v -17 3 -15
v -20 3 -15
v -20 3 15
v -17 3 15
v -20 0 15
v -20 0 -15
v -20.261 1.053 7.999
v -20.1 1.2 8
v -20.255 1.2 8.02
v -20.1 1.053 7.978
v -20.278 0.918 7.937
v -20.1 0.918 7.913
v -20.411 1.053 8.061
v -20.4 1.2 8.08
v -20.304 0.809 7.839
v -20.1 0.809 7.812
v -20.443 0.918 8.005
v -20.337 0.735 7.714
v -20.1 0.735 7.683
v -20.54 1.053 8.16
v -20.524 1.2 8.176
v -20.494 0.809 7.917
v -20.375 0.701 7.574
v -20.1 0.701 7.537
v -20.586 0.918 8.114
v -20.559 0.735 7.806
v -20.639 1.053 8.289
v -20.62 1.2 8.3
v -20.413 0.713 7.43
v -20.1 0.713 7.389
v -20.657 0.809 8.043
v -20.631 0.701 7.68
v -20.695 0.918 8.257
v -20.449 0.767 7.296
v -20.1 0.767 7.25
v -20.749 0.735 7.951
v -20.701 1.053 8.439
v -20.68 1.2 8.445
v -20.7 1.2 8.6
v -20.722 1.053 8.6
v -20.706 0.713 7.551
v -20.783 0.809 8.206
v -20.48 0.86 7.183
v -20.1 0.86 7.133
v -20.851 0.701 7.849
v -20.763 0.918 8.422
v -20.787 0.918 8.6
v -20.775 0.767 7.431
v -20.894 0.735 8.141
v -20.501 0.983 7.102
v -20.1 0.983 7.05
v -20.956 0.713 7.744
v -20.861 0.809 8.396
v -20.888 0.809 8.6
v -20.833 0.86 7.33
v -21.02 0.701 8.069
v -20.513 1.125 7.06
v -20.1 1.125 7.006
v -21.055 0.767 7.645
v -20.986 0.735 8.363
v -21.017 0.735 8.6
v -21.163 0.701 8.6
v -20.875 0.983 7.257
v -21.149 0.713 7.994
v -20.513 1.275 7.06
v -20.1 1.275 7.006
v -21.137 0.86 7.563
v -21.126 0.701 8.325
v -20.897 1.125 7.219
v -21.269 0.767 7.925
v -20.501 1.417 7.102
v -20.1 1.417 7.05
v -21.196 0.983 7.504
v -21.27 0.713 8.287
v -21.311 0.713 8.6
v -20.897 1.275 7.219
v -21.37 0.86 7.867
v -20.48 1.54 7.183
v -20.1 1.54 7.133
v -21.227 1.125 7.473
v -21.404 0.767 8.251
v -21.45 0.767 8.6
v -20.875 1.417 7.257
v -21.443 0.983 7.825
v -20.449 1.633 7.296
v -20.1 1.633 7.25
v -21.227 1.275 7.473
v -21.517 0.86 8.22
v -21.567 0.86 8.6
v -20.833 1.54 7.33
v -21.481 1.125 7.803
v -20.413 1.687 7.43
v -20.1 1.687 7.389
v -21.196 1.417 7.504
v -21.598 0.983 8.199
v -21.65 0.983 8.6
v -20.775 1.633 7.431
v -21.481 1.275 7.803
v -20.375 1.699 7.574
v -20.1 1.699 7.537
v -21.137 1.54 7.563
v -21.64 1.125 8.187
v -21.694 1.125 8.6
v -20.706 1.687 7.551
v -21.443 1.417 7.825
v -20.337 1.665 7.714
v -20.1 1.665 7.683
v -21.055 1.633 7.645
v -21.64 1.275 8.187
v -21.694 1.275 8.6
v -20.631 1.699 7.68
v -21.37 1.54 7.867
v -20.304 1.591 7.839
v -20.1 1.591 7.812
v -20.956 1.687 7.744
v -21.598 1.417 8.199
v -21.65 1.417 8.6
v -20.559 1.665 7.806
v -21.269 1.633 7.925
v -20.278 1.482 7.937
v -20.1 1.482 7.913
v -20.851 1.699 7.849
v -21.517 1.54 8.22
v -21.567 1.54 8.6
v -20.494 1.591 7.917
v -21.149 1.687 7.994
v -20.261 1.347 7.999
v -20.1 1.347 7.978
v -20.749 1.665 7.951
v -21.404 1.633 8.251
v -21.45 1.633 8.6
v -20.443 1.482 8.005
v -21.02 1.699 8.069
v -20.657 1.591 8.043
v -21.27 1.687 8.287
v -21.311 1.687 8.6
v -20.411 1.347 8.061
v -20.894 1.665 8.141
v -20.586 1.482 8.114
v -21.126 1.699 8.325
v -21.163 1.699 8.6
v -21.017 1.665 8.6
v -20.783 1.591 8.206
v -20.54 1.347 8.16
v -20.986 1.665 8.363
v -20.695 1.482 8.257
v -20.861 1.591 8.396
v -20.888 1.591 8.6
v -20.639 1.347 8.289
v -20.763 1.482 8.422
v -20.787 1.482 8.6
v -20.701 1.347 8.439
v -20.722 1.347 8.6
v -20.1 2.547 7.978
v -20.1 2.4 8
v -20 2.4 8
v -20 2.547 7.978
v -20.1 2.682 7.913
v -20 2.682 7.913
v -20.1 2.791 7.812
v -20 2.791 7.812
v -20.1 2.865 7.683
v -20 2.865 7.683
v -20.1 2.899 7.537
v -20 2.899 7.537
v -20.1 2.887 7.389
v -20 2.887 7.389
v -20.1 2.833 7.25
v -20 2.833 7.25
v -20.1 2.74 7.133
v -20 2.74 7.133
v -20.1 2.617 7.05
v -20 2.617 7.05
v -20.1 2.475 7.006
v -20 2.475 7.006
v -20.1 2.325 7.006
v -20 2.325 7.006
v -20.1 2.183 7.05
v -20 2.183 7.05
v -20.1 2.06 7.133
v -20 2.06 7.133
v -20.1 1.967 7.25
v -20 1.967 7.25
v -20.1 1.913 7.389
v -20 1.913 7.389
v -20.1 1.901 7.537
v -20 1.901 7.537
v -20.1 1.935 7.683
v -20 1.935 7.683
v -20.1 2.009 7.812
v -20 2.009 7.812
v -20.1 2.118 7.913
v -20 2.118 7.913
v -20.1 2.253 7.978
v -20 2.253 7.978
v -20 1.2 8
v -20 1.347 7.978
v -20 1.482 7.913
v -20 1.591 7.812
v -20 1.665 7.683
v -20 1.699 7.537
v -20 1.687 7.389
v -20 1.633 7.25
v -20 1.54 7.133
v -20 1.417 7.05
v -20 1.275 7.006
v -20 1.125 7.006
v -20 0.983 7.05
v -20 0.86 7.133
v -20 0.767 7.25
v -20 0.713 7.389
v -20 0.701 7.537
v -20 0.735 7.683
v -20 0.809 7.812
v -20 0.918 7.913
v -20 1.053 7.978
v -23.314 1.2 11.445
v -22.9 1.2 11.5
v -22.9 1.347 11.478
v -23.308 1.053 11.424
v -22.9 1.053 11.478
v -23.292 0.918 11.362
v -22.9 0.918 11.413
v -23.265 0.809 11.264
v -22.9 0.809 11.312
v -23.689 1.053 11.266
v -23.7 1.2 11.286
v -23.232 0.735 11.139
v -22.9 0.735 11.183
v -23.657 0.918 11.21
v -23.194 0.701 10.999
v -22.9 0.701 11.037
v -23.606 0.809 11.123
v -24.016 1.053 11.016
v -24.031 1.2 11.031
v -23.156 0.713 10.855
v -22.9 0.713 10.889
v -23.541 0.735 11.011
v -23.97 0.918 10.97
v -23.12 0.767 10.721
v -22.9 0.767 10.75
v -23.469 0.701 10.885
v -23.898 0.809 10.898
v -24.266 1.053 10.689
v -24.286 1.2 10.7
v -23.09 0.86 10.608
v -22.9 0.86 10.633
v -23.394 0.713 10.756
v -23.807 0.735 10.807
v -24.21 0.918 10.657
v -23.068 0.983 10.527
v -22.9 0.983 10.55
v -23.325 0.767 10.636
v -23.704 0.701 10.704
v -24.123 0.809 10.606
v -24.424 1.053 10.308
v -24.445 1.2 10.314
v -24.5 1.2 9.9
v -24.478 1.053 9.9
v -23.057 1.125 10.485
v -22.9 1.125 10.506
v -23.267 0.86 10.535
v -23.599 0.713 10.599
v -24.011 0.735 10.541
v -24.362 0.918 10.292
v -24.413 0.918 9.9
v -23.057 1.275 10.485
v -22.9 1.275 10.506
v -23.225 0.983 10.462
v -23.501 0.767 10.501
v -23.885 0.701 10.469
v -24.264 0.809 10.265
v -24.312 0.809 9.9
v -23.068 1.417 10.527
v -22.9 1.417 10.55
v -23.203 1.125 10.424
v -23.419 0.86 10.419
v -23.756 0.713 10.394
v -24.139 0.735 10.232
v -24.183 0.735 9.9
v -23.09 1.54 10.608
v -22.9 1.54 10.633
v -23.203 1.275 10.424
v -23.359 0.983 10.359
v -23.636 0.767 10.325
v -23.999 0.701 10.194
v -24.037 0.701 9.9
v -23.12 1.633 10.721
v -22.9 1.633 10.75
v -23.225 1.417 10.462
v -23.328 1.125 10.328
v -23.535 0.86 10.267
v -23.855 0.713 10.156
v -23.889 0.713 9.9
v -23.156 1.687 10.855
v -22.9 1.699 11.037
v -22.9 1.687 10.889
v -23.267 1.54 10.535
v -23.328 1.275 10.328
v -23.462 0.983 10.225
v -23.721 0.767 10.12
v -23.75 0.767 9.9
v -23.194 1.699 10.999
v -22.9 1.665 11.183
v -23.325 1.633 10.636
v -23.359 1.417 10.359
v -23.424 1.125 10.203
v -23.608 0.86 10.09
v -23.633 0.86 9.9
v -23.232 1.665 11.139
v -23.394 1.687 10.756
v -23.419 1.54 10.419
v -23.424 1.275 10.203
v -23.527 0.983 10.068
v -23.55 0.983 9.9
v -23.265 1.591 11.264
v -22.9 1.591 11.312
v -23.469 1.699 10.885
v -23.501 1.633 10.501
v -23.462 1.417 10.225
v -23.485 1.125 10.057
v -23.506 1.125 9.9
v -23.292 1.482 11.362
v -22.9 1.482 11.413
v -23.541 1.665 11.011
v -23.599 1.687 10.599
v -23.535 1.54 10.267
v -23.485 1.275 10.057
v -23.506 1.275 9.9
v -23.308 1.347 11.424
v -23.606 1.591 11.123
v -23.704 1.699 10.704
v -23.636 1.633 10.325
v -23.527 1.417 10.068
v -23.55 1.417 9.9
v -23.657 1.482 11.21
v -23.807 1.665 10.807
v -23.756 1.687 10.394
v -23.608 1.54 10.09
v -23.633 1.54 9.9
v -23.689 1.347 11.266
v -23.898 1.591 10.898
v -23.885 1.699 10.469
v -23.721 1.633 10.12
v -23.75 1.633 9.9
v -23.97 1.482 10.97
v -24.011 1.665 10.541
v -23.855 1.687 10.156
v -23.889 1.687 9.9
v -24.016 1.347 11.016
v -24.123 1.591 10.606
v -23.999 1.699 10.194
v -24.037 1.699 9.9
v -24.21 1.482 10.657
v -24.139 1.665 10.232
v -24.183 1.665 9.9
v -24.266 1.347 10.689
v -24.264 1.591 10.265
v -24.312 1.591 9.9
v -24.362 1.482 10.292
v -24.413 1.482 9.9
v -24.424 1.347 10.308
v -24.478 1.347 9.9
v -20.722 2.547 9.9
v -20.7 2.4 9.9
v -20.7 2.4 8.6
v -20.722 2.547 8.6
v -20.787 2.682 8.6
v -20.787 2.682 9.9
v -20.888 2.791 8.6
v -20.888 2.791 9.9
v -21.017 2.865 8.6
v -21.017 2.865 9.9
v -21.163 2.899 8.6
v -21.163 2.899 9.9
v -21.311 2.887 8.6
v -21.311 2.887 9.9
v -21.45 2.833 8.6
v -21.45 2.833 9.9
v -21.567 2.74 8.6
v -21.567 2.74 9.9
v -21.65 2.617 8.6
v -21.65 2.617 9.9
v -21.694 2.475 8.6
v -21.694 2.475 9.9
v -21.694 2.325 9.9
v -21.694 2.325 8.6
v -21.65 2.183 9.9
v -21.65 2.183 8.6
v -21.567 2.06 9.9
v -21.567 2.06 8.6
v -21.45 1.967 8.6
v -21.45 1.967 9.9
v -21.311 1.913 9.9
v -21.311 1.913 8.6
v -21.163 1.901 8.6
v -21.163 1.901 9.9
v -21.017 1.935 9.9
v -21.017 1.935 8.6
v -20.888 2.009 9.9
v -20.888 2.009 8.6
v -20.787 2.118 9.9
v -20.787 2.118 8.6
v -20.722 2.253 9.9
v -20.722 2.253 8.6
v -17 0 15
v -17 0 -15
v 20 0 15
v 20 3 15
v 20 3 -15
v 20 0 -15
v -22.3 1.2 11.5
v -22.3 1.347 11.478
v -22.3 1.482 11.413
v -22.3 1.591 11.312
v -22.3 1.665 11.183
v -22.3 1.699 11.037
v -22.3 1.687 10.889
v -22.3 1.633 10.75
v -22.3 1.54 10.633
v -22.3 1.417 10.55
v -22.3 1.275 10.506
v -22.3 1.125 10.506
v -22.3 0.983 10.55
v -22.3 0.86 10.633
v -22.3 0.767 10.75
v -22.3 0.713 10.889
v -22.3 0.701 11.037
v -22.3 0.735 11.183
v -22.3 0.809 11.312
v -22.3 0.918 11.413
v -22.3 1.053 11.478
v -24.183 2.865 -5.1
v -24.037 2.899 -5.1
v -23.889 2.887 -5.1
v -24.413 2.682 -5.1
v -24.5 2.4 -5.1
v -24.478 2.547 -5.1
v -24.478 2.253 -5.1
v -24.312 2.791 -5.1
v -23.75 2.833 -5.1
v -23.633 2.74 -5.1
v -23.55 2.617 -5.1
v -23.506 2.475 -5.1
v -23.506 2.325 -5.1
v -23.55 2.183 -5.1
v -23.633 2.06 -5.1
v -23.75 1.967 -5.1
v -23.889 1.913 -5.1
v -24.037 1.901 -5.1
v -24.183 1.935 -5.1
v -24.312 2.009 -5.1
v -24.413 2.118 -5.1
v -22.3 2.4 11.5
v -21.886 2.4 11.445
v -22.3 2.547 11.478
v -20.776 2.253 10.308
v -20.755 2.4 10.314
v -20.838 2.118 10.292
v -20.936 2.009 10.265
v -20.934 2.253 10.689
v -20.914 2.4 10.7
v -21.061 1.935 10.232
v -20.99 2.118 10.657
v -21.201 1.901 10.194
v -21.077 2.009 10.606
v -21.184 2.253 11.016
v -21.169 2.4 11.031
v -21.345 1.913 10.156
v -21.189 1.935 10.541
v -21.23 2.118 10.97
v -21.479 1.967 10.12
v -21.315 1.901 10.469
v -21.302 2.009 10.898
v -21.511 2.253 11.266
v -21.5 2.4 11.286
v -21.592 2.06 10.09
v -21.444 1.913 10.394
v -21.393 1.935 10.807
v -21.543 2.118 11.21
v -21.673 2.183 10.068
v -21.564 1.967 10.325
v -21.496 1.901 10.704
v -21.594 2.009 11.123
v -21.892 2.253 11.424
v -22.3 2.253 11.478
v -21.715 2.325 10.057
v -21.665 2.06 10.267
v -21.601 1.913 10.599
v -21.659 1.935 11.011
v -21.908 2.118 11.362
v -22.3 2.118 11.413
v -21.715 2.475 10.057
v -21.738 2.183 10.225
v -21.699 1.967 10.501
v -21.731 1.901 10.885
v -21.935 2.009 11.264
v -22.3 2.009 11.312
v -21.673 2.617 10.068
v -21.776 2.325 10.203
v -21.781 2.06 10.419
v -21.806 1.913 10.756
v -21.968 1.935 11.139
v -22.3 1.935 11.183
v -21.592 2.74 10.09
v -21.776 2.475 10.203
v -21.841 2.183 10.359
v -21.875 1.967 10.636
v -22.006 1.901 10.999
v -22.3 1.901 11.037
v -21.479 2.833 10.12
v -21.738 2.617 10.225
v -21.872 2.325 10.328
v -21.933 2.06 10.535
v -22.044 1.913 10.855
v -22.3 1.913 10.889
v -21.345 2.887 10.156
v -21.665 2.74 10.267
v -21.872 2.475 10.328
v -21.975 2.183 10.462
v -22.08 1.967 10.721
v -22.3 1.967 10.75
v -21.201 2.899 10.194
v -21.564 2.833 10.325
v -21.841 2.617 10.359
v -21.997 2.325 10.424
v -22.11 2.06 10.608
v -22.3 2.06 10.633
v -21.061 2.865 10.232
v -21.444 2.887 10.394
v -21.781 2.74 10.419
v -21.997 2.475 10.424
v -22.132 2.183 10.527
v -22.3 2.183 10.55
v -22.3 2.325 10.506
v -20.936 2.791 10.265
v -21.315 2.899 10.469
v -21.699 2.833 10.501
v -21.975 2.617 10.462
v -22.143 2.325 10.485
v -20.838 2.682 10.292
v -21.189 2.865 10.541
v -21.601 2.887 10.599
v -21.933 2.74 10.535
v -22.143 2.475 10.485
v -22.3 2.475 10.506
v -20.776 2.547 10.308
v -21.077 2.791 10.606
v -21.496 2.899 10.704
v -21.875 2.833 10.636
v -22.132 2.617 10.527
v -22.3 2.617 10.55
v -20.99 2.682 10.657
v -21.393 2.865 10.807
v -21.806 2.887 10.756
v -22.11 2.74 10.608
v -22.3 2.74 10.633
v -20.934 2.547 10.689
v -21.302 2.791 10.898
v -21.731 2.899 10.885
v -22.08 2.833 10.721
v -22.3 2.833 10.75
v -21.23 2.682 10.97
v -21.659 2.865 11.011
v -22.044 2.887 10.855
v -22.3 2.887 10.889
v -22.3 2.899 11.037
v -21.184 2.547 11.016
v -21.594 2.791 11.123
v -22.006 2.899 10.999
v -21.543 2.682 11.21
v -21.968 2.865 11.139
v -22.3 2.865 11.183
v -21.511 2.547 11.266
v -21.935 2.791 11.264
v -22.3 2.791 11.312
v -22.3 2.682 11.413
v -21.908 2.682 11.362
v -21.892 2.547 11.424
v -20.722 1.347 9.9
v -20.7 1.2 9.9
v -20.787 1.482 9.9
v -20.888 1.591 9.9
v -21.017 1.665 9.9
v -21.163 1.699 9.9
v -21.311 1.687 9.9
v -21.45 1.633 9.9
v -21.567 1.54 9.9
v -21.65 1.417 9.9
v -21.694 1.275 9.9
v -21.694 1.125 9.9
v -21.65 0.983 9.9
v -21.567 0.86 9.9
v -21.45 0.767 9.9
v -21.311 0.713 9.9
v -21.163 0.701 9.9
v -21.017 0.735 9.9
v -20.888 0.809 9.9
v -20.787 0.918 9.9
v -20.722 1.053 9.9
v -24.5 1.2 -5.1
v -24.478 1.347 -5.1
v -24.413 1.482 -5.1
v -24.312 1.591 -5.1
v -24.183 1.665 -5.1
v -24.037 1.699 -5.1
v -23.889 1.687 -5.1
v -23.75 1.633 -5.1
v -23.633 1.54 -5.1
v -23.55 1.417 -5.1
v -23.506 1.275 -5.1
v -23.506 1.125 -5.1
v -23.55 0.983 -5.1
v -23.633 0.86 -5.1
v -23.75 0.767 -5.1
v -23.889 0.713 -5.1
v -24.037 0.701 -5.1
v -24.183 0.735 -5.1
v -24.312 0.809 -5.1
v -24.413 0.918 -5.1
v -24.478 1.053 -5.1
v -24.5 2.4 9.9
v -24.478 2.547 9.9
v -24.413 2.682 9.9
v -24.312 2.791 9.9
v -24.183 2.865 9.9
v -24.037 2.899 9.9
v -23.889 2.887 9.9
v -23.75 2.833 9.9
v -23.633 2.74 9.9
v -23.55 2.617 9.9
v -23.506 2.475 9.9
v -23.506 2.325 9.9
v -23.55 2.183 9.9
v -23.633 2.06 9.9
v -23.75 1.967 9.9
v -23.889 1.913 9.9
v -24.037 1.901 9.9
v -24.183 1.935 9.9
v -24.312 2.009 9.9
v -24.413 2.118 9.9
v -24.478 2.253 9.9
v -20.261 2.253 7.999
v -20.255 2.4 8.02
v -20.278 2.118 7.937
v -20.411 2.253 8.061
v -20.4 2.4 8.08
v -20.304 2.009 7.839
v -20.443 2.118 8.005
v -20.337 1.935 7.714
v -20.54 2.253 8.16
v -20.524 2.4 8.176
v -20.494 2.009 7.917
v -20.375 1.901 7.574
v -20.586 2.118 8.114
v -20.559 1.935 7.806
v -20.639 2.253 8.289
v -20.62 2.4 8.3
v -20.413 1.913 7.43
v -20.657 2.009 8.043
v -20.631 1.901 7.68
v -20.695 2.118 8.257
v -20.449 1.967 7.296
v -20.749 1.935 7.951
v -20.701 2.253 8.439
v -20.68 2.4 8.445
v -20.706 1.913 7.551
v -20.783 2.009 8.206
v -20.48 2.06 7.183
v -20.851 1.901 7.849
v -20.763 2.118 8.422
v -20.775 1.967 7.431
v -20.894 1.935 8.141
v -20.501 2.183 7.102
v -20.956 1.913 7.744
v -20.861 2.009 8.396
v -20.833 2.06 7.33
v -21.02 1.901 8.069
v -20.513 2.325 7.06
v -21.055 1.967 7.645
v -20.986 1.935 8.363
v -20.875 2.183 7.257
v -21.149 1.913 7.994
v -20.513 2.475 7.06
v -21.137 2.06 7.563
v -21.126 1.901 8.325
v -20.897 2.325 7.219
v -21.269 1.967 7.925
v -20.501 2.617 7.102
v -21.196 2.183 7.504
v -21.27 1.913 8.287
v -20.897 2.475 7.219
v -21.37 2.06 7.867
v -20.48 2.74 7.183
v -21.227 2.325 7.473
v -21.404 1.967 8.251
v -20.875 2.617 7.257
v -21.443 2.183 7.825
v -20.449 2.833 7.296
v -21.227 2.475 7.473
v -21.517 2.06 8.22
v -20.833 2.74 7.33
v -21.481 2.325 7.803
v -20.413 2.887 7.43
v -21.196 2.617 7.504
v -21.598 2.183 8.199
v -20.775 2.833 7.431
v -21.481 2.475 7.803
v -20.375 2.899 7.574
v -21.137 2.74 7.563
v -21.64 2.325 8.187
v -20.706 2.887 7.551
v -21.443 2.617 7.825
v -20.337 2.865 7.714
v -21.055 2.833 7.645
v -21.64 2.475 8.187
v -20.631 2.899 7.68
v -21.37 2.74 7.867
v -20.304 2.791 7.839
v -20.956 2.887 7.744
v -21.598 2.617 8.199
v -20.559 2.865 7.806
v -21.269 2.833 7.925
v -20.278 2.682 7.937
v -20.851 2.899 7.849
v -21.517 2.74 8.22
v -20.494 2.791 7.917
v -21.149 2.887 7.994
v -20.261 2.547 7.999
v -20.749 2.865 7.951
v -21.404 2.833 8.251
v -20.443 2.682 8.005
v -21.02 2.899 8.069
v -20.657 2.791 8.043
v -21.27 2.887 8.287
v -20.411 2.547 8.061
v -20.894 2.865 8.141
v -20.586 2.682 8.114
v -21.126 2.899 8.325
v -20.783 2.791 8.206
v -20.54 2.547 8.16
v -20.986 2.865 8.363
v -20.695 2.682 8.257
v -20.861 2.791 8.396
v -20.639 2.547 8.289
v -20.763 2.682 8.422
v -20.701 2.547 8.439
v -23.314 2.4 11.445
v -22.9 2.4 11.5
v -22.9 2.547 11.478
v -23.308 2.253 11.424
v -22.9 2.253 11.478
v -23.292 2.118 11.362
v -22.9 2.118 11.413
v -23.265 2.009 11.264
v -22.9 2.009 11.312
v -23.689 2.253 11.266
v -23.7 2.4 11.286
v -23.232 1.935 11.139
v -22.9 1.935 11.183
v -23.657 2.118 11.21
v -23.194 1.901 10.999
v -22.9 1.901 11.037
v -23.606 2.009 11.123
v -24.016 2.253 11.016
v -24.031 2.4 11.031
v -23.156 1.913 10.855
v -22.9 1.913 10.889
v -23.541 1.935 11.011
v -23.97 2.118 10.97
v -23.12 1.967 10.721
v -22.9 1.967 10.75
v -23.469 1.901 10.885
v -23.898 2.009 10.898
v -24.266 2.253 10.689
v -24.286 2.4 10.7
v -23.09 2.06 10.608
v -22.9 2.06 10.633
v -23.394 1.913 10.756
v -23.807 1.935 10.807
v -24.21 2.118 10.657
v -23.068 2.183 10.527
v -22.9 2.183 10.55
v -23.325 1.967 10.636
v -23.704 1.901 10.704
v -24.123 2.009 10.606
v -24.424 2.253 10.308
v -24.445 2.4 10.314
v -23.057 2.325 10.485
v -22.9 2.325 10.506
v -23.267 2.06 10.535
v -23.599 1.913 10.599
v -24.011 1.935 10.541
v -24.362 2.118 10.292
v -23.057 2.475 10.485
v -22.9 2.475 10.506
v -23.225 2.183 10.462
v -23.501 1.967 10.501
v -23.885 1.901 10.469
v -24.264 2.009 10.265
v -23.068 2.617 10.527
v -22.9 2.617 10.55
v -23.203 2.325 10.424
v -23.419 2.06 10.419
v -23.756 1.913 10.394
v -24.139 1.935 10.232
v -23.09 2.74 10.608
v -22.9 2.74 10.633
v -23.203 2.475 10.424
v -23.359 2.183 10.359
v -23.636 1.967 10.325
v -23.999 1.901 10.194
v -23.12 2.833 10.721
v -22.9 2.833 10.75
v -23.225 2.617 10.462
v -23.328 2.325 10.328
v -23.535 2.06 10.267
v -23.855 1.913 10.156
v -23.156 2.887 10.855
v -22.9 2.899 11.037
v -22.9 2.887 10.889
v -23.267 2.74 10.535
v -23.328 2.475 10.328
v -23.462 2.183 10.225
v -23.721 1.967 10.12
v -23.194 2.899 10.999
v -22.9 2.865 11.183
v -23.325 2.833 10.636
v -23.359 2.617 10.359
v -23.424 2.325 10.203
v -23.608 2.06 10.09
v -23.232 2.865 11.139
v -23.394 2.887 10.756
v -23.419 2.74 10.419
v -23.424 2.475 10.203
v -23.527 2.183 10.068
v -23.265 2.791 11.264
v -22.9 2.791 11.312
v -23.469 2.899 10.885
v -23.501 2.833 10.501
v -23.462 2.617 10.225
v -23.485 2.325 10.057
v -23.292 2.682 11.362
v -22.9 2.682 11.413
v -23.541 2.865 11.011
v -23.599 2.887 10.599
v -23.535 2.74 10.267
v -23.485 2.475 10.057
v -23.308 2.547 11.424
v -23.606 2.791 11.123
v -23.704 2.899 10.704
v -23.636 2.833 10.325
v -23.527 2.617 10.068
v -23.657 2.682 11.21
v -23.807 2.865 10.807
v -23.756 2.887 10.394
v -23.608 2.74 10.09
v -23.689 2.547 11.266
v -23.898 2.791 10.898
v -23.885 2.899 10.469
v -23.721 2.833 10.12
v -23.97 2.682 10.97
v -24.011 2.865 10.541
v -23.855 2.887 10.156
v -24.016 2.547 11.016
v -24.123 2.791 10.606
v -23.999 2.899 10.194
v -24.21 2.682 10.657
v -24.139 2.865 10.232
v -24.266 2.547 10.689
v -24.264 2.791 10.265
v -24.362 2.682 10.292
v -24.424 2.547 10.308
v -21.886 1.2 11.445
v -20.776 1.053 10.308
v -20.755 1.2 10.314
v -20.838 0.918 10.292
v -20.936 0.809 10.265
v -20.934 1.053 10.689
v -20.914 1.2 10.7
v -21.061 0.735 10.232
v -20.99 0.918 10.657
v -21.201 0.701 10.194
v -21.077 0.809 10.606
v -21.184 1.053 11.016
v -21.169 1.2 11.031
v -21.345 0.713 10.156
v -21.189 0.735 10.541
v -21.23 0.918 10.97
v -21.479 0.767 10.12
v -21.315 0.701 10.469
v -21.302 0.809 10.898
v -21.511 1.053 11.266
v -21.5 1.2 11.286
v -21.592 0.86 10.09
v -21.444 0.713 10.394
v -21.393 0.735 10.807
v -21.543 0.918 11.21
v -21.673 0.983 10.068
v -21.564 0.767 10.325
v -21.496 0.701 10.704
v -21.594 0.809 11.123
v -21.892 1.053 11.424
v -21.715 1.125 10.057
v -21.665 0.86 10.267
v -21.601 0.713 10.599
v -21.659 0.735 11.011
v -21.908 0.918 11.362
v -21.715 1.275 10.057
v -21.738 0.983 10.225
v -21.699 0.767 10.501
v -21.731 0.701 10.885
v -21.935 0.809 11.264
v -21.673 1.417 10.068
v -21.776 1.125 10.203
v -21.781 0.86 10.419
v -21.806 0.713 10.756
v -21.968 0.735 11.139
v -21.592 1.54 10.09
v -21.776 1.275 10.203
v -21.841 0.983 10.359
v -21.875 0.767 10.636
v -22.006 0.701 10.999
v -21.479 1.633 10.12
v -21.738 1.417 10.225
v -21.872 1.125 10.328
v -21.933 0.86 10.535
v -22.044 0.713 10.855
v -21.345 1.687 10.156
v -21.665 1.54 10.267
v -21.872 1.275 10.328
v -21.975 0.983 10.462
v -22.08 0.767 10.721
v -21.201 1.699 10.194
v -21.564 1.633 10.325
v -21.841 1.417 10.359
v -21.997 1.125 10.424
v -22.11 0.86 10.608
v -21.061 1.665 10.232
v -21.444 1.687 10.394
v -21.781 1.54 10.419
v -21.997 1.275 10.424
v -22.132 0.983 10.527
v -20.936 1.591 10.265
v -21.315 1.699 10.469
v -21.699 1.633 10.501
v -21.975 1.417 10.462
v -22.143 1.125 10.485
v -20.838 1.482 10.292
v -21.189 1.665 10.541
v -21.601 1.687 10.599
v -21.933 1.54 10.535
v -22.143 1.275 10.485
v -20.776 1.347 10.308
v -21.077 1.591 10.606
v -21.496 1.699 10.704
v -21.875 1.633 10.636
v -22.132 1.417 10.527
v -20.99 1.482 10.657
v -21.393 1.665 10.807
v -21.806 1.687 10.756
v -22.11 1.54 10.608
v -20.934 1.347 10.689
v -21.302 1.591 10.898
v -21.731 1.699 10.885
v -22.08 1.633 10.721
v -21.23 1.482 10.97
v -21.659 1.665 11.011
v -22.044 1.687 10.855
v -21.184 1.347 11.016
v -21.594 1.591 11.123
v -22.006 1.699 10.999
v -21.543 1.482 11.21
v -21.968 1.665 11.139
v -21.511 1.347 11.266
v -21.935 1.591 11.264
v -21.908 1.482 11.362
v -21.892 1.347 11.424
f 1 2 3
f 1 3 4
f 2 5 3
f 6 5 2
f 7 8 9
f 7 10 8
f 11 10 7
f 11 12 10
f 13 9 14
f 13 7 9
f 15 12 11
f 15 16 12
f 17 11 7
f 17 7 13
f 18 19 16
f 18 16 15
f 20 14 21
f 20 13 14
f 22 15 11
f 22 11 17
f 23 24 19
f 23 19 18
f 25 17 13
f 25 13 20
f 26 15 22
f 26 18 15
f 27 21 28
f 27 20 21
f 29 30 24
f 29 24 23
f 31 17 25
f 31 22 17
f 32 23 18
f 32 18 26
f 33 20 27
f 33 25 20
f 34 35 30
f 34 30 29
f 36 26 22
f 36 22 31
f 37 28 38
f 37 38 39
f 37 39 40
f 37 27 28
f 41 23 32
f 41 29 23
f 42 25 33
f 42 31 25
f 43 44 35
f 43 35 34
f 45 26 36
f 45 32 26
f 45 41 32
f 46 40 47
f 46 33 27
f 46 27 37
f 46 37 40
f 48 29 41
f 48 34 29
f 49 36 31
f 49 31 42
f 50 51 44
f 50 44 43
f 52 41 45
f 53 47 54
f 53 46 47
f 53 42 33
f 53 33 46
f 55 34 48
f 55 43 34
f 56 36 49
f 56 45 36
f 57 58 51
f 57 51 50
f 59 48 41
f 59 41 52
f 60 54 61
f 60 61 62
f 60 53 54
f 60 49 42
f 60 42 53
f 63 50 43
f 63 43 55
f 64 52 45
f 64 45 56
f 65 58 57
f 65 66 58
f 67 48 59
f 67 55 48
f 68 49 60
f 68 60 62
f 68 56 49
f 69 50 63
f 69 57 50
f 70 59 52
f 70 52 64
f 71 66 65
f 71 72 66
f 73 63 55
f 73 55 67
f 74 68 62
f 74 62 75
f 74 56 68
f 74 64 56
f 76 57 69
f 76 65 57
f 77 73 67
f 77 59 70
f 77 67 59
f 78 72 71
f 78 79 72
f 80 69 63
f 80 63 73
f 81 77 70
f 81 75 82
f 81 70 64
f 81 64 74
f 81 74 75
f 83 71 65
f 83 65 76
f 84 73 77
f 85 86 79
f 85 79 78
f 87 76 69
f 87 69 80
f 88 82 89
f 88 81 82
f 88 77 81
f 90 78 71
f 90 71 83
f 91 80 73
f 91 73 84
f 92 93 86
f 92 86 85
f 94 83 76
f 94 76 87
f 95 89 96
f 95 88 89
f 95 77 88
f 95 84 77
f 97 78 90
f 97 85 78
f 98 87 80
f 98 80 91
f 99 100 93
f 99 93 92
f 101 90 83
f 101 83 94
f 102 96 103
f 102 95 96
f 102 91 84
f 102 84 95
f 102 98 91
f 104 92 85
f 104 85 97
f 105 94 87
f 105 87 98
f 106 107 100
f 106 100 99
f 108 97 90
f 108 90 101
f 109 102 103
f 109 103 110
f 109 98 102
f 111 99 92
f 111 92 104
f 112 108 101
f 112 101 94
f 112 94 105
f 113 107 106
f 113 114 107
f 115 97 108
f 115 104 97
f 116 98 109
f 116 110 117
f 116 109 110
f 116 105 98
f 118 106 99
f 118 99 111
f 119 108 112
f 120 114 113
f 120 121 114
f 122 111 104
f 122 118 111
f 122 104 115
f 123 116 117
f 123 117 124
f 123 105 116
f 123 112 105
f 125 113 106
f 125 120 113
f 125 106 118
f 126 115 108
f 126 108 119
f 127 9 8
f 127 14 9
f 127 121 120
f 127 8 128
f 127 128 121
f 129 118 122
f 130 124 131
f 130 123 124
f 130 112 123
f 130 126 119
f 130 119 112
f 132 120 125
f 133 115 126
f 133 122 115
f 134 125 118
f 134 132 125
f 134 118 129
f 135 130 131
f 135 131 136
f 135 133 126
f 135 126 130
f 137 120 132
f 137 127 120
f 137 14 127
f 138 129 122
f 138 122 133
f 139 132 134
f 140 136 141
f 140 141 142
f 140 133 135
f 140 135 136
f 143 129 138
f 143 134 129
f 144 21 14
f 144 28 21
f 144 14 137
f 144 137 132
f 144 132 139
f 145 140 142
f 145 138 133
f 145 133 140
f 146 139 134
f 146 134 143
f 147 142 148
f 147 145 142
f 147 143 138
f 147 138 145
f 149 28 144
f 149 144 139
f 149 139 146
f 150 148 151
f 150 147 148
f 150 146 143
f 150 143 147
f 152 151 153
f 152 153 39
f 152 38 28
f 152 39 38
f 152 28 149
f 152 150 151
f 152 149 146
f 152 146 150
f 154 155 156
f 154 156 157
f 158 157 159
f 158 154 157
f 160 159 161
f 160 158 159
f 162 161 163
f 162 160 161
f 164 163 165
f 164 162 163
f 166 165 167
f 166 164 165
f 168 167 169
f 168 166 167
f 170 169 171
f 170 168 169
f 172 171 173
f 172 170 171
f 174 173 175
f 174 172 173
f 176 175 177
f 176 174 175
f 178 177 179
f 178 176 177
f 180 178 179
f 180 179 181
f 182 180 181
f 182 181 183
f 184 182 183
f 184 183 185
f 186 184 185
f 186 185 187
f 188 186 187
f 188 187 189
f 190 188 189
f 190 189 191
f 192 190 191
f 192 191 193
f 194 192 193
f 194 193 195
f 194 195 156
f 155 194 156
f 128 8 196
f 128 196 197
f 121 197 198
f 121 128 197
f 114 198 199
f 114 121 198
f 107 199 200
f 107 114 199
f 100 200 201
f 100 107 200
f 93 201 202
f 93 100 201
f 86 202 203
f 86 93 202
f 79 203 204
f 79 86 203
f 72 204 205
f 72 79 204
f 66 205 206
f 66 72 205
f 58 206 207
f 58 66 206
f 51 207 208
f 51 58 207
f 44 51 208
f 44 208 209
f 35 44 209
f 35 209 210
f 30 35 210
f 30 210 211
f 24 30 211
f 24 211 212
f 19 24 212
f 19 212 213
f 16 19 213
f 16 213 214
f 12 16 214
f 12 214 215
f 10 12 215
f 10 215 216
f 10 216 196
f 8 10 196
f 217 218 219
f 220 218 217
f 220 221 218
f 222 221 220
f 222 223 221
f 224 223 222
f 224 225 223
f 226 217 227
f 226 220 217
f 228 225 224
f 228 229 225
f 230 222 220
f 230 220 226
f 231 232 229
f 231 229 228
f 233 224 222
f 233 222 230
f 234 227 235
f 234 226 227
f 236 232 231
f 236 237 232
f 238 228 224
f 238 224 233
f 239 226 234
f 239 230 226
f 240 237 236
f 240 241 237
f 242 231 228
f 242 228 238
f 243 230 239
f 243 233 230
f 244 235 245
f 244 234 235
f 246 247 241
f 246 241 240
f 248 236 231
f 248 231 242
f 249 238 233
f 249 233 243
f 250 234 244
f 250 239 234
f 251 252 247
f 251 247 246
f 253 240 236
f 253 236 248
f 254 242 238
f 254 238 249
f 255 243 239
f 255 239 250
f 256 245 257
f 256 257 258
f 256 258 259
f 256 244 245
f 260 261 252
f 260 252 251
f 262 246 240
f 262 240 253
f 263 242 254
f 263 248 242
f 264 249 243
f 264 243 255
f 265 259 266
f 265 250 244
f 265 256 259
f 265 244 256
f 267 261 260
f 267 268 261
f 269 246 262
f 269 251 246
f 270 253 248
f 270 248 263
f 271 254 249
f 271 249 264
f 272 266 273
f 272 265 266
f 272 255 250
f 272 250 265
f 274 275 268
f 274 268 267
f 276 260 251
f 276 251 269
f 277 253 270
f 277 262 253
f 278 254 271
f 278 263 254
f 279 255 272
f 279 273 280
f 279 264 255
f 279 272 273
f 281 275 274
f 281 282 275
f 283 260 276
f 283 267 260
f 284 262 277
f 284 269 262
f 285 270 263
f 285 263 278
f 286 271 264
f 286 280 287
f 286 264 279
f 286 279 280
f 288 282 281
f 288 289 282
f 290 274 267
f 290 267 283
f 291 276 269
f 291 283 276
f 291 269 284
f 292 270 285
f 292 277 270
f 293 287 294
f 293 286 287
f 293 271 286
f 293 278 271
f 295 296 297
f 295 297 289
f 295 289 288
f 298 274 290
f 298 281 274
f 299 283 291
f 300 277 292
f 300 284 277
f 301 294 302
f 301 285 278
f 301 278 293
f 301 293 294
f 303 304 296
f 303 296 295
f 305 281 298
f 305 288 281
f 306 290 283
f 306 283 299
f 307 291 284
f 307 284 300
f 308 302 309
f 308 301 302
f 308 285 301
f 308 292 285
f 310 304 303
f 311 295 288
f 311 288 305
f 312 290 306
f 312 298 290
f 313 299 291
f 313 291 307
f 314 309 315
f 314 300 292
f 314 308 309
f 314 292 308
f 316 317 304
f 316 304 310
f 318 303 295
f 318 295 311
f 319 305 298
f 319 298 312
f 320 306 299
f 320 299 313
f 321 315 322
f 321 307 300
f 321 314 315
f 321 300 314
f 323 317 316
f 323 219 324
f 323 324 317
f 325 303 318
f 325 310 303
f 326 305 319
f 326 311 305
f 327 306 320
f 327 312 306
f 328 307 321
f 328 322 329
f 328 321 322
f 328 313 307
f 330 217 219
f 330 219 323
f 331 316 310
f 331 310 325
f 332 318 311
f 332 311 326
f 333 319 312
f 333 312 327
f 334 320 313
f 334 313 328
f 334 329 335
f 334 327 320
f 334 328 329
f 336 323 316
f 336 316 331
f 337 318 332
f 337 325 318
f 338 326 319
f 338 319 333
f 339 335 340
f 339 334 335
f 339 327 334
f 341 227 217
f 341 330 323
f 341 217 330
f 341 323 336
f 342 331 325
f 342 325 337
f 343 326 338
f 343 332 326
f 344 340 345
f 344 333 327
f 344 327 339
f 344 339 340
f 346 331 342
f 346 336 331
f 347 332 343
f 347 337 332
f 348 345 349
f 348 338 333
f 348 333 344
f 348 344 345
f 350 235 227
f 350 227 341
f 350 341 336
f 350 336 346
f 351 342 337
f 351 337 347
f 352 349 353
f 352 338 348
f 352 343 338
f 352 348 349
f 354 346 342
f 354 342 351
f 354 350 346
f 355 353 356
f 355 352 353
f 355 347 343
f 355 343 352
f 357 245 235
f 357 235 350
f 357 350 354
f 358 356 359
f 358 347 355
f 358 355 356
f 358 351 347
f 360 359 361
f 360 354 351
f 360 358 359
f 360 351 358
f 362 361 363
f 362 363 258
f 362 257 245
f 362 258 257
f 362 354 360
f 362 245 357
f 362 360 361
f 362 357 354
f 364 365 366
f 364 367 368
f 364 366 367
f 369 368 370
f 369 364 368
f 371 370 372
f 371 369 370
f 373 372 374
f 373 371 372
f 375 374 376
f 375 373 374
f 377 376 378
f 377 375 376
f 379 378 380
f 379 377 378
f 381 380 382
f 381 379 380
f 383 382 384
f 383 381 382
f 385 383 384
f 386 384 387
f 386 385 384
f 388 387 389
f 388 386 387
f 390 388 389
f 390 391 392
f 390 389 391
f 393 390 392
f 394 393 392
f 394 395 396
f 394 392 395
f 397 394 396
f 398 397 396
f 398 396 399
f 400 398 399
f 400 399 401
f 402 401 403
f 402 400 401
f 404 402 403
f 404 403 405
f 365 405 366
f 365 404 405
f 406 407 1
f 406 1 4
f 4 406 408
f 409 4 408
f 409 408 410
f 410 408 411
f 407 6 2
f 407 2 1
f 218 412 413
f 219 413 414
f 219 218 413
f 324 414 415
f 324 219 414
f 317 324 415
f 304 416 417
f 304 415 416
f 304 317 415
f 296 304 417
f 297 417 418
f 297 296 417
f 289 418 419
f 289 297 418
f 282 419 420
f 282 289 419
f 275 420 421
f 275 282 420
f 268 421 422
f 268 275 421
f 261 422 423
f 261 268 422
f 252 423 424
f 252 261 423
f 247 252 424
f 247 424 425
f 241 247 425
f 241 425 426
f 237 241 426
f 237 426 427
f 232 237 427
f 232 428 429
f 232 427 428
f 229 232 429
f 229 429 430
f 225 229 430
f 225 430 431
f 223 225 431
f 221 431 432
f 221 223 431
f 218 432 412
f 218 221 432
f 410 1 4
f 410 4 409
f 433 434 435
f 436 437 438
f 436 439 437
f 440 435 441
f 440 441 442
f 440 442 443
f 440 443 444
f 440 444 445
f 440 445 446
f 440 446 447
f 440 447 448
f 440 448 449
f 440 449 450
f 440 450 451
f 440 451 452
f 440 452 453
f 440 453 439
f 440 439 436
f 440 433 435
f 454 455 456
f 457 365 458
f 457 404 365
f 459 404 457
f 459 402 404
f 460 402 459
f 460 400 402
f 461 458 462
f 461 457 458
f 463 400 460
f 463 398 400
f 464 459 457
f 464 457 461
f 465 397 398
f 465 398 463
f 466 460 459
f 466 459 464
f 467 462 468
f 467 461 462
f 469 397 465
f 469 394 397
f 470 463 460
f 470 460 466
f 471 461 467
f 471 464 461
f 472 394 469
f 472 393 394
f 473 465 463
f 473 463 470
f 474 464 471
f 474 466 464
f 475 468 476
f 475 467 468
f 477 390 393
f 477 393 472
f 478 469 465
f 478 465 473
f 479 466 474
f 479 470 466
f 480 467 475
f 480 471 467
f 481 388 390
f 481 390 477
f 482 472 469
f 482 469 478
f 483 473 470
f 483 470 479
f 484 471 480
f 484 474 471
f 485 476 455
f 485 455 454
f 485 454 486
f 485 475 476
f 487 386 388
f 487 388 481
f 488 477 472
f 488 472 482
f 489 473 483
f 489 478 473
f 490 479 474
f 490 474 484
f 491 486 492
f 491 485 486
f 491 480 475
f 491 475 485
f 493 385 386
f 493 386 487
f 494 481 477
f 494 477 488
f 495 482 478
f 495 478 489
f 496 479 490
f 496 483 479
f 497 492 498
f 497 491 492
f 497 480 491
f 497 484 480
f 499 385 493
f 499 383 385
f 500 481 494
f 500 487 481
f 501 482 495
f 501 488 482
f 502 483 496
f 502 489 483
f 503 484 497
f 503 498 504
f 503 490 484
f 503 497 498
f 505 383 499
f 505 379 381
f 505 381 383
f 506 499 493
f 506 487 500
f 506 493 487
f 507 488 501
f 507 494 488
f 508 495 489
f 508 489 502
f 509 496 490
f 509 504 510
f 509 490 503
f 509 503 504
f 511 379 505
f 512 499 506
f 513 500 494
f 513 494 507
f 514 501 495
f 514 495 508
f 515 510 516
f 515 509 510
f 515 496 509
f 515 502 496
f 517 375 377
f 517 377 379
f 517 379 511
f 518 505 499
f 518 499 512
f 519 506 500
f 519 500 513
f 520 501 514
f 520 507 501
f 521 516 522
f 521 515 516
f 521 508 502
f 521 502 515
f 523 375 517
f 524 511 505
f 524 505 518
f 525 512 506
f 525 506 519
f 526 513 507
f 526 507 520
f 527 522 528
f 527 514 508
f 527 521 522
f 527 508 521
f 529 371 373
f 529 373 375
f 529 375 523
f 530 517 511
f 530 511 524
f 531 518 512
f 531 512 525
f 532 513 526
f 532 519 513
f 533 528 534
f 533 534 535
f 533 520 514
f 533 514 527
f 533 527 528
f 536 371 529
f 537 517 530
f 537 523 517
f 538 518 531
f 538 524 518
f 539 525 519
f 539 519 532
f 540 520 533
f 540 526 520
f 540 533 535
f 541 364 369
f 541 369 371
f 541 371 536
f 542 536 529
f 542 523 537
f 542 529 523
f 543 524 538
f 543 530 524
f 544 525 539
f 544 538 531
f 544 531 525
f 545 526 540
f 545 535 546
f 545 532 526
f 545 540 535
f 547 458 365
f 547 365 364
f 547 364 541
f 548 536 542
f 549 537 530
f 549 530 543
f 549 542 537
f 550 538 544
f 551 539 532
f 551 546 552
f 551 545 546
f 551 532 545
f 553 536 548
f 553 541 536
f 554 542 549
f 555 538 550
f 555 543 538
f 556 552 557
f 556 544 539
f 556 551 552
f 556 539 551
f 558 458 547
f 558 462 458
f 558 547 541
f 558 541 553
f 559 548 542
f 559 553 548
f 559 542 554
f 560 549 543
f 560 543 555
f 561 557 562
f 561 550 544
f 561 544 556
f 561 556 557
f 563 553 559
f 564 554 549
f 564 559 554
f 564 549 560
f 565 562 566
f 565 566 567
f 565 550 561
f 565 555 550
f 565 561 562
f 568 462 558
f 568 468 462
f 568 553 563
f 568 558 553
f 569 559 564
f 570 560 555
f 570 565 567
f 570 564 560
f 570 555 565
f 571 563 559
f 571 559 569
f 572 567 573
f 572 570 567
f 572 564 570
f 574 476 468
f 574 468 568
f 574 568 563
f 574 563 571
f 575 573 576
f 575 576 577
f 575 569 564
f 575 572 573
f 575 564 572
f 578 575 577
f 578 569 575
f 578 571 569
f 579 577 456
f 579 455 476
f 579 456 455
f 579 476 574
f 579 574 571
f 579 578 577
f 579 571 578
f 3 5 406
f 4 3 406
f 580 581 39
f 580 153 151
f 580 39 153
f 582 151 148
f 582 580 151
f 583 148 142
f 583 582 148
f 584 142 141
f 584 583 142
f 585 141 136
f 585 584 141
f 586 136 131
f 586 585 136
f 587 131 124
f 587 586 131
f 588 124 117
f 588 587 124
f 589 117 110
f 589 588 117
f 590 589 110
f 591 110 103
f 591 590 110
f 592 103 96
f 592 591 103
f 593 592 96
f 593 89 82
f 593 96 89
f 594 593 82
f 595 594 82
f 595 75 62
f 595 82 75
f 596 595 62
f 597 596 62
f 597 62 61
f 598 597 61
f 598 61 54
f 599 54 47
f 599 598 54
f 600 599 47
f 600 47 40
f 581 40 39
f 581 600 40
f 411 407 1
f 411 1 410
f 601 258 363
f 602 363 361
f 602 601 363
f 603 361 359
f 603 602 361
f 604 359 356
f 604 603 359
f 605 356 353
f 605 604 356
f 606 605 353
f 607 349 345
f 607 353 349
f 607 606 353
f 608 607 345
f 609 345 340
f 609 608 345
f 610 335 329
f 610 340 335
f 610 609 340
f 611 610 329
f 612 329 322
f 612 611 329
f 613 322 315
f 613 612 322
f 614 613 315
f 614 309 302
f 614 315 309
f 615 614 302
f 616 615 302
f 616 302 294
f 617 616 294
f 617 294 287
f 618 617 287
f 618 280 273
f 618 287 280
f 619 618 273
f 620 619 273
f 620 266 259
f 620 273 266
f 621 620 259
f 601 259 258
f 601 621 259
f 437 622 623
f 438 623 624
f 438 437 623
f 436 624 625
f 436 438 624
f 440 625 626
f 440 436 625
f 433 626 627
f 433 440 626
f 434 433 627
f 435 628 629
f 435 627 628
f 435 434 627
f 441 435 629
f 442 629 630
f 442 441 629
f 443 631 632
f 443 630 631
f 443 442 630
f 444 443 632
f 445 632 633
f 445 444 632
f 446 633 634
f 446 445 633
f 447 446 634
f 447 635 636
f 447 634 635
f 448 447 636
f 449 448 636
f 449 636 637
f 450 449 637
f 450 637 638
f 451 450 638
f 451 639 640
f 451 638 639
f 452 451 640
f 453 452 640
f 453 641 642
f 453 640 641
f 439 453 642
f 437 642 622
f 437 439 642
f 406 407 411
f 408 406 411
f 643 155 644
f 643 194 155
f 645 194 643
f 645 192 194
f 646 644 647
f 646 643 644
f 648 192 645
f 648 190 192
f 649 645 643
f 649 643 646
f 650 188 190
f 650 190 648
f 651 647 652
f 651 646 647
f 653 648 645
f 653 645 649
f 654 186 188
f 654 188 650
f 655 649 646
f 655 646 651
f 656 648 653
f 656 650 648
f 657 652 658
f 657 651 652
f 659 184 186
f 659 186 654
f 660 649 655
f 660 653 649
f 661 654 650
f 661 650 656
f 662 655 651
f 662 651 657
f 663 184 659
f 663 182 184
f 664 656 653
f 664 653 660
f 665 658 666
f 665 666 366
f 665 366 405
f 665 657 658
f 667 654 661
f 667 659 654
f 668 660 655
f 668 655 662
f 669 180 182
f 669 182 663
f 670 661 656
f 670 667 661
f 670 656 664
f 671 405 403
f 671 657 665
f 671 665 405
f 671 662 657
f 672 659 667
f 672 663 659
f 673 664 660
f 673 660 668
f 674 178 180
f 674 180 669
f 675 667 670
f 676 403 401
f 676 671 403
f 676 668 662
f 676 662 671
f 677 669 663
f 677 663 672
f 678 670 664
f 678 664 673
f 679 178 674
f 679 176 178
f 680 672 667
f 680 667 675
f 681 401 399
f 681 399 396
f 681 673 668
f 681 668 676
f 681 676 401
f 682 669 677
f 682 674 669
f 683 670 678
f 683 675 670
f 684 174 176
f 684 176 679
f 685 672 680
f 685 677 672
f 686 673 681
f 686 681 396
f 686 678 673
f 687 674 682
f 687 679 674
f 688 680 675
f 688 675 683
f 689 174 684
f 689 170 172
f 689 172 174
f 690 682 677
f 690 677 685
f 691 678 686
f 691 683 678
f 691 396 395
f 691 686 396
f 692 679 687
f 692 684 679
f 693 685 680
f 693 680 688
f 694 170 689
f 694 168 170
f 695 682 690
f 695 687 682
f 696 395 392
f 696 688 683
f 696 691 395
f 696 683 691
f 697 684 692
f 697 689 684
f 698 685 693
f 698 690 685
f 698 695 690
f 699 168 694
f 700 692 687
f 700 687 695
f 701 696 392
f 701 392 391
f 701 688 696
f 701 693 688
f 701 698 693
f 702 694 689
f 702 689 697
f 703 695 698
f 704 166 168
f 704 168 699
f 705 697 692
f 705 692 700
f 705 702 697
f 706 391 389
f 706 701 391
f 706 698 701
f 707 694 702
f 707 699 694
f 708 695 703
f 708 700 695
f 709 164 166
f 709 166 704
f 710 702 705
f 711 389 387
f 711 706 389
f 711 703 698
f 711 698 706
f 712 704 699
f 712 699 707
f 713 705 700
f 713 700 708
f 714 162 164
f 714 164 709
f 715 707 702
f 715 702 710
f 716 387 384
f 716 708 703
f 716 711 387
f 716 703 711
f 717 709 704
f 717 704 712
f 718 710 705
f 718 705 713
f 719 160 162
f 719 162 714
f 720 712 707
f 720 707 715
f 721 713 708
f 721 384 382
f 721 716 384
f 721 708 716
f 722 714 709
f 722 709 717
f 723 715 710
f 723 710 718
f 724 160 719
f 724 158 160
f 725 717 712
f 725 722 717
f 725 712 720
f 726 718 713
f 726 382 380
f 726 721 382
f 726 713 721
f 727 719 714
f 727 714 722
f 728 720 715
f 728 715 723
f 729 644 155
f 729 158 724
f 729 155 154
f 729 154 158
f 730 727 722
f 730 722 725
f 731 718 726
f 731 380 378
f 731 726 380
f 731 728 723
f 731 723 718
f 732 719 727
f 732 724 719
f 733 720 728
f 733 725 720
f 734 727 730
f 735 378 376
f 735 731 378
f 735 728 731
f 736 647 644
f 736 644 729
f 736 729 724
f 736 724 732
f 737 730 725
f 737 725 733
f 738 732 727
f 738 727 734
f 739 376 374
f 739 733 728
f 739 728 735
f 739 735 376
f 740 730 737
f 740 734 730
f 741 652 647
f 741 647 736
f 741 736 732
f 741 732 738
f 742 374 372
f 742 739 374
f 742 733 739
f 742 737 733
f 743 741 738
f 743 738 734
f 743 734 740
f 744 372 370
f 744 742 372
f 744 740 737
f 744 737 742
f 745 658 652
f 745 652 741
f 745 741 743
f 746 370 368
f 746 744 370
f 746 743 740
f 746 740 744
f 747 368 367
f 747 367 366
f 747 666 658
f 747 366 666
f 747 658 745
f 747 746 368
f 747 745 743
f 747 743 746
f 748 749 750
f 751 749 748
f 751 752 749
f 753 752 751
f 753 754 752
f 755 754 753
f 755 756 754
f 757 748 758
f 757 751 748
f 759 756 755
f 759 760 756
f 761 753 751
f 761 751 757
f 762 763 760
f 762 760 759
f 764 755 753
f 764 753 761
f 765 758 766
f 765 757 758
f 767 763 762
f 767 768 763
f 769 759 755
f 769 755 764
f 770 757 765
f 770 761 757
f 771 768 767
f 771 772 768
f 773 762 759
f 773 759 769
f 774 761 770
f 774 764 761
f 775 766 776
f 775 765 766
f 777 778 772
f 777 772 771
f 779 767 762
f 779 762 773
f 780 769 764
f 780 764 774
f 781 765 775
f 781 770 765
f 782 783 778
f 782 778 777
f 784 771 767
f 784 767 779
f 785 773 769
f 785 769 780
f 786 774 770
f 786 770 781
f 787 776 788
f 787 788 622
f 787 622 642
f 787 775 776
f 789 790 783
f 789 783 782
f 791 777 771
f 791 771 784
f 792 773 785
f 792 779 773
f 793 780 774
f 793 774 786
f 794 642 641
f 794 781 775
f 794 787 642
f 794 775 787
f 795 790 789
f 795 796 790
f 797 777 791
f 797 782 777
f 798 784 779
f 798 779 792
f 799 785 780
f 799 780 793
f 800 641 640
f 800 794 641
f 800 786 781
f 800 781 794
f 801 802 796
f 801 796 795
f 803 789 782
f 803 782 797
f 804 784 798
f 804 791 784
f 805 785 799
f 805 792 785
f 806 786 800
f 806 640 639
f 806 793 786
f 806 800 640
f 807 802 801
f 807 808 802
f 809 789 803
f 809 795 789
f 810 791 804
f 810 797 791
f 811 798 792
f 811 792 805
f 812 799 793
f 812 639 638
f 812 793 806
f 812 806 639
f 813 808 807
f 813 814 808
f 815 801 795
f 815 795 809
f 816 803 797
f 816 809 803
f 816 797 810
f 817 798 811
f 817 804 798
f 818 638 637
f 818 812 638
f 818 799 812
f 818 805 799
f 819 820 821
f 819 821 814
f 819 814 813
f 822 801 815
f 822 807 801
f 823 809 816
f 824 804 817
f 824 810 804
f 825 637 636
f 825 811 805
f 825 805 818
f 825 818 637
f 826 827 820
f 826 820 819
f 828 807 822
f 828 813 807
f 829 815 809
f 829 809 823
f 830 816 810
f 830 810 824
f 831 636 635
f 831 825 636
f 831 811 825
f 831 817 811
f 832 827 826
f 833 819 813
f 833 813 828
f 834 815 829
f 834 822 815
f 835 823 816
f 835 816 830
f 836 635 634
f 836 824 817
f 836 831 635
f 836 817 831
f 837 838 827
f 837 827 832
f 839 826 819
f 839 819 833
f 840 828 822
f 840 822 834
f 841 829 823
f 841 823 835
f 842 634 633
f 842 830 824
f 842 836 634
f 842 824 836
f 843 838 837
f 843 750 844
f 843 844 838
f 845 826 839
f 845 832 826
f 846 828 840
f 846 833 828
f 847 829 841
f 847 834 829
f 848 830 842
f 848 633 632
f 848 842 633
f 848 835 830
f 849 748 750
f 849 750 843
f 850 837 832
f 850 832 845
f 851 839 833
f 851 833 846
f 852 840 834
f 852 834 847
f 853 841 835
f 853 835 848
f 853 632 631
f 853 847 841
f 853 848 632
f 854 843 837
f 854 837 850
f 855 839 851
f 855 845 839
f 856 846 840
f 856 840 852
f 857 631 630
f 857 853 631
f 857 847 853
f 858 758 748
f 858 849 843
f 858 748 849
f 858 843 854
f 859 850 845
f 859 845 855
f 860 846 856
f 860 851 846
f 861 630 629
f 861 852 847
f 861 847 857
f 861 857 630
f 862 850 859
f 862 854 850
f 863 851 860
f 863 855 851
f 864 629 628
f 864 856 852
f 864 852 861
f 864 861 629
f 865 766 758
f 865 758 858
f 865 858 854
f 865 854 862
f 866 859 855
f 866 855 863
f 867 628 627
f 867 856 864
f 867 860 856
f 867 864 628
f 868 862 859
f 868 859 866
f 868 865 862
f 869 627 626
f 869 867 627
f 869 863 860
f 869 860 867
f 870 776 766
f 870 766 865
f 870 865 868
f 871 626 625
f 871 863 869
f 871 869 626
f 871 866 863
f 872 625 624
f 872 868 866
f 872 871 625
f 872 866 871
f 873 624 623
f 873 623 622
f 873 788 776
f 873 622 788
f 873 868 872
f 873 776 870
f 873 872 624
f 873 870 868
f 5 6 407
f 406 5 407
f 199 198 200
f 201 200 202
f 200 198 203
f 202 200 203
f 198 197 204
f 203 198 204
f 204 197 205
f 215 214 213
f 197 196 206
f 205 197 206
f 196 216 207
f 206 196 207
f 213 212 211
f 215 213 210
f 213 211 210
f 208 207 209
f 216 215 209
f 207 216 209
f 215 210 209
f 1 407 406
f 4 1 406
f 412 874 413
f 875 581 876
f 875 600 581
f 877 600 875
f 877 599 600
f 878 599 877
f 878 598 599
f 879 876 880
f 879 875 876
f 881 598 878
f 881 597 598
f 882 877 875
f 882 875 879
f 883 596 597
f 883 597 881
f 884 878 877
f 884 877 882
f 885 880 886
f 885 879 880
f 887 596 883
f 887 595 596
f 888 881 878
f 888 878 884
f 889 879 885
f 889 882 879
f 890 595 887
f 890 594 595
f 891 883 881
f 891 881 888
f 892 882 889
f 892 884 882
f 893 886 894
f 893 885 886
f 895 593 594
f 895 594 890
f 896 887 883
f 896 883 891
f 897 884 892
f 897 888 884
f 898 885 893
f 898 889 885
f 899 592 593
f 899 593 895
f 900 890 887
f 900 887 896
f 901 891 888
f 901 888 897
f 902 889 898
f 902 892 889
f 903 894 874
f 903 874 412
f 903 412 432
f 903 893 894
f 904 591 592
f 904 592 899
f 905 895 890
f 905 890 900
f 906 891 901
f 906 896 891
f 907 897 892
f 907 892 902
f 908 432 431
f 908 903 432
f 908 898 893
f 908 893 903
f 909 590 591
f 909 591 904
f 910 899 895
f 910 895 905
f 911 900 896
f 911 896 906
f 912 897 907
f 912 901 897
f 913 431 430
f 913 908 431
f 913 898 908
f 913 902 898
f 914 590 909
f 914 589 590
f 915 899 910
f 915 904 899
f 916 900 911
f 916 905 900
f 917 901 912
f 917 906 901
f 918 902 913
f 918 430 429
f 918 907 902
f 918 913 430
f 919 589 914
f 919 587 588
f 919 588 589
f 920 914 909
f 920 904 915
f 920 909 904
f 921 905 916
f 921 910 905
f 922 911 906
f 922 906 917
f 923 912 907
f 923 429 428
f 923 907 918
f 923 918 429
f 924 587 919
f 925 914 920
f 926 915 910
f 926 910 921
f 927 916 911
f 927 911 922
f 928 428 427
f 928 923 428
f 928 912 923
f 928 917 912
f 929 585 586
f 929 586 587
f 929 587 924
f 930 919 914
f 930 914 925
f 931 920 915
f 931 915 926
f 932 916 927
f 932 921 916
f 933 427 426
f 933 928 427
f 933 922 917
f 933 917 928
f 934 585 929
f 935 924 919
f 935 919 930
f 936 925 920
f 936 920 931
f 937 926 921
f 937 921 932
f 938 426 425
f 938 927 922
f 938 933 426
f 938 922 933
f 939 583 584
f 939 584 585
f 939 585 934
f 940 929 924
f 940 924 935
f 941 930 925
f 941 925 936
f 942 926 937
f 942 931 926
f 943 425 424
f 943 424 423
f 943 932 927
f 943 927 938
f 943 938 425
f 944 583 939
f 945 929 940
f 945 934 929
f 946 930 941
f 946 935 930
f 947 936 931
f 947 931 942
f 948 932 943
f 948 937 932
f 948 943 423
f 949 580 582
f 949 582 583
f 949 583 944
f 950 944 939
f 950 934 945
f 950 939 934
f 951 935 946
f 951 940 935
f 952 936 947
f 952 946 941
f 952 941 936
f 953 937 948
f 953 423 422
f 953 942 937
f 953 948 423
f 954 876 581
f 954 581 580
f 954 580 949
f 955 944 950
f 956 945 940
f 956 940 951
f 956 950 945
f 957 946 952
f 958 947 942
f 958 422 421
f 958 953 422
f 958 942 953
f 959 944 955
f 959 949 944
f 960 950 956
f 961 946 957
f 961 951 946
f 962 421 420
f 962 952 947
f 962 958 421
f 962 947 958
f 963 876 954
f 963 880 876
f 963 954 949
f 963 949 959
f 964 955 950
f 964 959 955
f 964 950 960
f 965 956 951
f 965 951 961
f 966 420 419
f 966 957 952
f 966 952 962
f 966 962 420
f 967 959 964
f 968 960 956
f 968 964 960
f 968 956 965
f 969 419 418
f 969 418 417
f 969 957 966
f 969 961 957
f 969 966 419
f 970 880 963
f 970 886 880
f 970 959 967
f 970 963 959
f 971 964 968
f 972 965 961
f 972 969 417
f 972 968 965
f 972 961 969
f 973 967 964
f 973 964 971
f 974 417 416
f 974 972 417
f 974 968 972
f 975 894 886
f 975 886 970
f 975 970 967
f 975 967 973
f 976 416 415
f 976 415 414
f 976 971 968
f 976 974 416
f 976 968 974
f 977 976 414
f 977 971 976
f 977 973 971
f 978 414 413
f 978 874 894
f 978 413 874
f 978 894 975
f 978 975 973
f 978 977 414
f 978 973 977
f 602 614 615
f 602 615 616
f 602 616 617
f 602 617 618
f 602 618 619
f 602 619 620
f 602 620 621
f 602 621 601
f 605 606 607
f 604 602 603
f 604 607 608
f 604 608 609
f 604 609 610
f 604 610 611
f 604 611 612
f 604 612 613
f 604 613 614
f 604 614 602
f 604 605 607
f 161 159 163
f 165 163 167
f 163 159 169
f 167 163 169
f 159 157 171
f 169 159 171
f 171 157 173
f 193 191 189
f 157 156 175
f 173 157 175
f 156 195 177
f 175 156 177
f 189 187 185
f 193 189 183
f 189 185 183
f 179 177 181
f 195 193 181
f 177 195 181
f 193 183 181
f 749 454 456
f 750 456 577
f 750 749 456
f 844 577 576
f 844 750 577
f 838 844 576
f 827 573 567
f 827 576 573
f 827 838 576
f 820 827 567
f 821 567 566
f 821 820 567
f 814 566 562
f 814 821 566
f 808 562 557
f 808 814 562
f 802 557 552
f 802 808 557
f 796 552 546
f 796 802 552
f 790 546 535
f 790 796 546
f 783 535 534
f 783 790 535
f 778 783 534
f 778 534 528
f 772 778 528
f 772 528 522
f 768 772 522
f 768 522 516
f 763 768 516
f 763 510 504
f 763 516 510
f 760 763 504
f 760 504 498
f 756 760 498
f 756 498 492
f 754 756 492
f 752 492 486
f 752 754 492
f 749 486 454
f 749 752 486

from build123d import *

# Parameters (mm, degrees)
SKETCH1_W              = 40
SKETCH1_H              = 30
BOSS_EXTRUDE1_DEPTH    = 3
SKETCH7_R              = 0.5
SKETCH5_R              = 0.5
SPLIT1_SURFACE_1_BACK  = 54.752
SPLIT1_SURFACE_1_DEPTH = 109.504
SPLIT1_SURFACE_2_BACK  = 54.752
SPLIT1_SURFACE_2_DEPTH = 109.504


with BuildPart() as part:
    # Sketch1 → Boss-Extrude1 (new body)
    with BuildSketch(Plane(origin=(0, 0, 0), x_dir=(1, 0, 0), z_dir=(0, 1, 0))):
        Rectangle(SKETCH1_W, SKETCH1_H)
    extrude(amount=BOSS_EXTRUDE1_DEPTH)

    # Sweep1: sweep along a path in Sketch3
    with BuildLine(Plane(origin=(0, 1.2, 0), x_dir=(-1, 0, 0), z_dir=(0, -1, 0))) as sweep1_path:
        Line((20, -7.5), (20.1, -7.5))
        ThreePointArc((20.1, -7.5), (20.877817459, -7.822182541), (21.2, -8.6))
        Line((21.2, -8.6), (21.2, -9.9))
        ThreePointArc((21.2, -9.9), (21.522182541, -10.677817459), (22.3, -11))
        Line((22.3, -11), (22.9, -11))
        ThreePointArc((22.9, -11), (23.677817459, -10.677817459), (24, -9.9))
        Line((24, -9.9), (24, 5.1))
    # Sketch7 → Sweep1 (sweep)
    with BuildSketch(Plane.ZY.offset(20)):
        with Locations((7.5, 1.2)):
            Circle(SKETCH7_R)
    sweep(path=sweep1_path.line)

    # Sweep2: sweep along a path in Sketch4
    with BuildLine(Plane(origin=(0, 2.4, 0), x_dir=(-1, 0, 0), z_dir=(0, -1, 0))) as sweep2_path:
        Line((20, -7.5), (20.1, -7.5))
        ThreePointArc((20.1, -7.5), (20.877817459, -7.822182541), (21.2, -8.6))
        Line((21.2, -8.6), (21.2, -9.9))
        ThreePointArc((21.2, -9.9), (21.522182541, -10.677817459), (22.3, -11))
        Line((22.3, -11), (22.9, -11))
        ThreePointArc((22.9, -11), (23.677817459, -10.677817459), (24, -9.9))
        Line((24, -9.9), (24, 5.1))
    # Sketch5 → Sweep2 (sweep)
    with BuildSketch(Plane.ZY.offset(20)):
        with Locations((7.5, 2.4)):
            Circle(SKETCH5_R)
    sweep(path=sweep2_path.line)


with BuildPart() as body_2:
    # Split1: the piece behind the surface
    add(part.part)
    # Split1 surface: a surface, the sketch's curves swept straight by 109.504 mm
    with BuildLine(Plane(origin=(0, 3, 0), x_dir=(1, 0, 0), z_dir=(0, 1, 0)).offset(-SPLIT1_SURFACE_1_BACK), mode=Mode.PRIVATE) as split1_surface_1_path:
        Line((-20, 15), (-17, 15))
        Line((-17, 15), (-17, -15))
        Line((-17, -15), (-20, -15))
        Line((-20, -15), (-20, 15))
    split1_surface_1 = Shell.extrude(split1_surface_1_path.wire(), (0 * SPLIT1_SURFACE_1_DEPTH, 1 * SPLIT1_SURFACE_1_DEPTH, 0 * SPLIT1_SURFACE_1_DEPTH))
    split(bisect_by=split1_surface_1, keep=Keep.BOTTOM)


with BuildPart() as part_1:
    add(part.part)

    # Split1: split by a surface, the side it looks to stays
    # Split1 surface: a surface, the sketch's curves swept straight by 109.504 mm
    with BuildLine(Plane(origin=(0, 3, 0), x_dir=(1, 0, 0), z_dir=(0, 1, 0)).offset(-SPLIT1_SURFACE_2_BACK), mode=Mode.PRIVATE) as split1_surface_2_path:
        Line((-20, 15), (-17, 15))
        Line((-17, 15), (-17, -15))
        Line((-17, -15), (-20, -15))
        Line((-20, -15), (-20, 15))
    split1_surface_2 = Shell.extrude(split1_surface_2_path.wire(), (0 * SPLIT1_SURFACE_2_DEPTH, 1 * SPLIT1_SURFACE_2_DEPTH, 0 * SPLIT1_SURFACE_2_DEPTH))
    split(bisect_by=split1_surface_2, keep=Keep.TOP)


solid = Compound([body_2.part, part_1.part])
